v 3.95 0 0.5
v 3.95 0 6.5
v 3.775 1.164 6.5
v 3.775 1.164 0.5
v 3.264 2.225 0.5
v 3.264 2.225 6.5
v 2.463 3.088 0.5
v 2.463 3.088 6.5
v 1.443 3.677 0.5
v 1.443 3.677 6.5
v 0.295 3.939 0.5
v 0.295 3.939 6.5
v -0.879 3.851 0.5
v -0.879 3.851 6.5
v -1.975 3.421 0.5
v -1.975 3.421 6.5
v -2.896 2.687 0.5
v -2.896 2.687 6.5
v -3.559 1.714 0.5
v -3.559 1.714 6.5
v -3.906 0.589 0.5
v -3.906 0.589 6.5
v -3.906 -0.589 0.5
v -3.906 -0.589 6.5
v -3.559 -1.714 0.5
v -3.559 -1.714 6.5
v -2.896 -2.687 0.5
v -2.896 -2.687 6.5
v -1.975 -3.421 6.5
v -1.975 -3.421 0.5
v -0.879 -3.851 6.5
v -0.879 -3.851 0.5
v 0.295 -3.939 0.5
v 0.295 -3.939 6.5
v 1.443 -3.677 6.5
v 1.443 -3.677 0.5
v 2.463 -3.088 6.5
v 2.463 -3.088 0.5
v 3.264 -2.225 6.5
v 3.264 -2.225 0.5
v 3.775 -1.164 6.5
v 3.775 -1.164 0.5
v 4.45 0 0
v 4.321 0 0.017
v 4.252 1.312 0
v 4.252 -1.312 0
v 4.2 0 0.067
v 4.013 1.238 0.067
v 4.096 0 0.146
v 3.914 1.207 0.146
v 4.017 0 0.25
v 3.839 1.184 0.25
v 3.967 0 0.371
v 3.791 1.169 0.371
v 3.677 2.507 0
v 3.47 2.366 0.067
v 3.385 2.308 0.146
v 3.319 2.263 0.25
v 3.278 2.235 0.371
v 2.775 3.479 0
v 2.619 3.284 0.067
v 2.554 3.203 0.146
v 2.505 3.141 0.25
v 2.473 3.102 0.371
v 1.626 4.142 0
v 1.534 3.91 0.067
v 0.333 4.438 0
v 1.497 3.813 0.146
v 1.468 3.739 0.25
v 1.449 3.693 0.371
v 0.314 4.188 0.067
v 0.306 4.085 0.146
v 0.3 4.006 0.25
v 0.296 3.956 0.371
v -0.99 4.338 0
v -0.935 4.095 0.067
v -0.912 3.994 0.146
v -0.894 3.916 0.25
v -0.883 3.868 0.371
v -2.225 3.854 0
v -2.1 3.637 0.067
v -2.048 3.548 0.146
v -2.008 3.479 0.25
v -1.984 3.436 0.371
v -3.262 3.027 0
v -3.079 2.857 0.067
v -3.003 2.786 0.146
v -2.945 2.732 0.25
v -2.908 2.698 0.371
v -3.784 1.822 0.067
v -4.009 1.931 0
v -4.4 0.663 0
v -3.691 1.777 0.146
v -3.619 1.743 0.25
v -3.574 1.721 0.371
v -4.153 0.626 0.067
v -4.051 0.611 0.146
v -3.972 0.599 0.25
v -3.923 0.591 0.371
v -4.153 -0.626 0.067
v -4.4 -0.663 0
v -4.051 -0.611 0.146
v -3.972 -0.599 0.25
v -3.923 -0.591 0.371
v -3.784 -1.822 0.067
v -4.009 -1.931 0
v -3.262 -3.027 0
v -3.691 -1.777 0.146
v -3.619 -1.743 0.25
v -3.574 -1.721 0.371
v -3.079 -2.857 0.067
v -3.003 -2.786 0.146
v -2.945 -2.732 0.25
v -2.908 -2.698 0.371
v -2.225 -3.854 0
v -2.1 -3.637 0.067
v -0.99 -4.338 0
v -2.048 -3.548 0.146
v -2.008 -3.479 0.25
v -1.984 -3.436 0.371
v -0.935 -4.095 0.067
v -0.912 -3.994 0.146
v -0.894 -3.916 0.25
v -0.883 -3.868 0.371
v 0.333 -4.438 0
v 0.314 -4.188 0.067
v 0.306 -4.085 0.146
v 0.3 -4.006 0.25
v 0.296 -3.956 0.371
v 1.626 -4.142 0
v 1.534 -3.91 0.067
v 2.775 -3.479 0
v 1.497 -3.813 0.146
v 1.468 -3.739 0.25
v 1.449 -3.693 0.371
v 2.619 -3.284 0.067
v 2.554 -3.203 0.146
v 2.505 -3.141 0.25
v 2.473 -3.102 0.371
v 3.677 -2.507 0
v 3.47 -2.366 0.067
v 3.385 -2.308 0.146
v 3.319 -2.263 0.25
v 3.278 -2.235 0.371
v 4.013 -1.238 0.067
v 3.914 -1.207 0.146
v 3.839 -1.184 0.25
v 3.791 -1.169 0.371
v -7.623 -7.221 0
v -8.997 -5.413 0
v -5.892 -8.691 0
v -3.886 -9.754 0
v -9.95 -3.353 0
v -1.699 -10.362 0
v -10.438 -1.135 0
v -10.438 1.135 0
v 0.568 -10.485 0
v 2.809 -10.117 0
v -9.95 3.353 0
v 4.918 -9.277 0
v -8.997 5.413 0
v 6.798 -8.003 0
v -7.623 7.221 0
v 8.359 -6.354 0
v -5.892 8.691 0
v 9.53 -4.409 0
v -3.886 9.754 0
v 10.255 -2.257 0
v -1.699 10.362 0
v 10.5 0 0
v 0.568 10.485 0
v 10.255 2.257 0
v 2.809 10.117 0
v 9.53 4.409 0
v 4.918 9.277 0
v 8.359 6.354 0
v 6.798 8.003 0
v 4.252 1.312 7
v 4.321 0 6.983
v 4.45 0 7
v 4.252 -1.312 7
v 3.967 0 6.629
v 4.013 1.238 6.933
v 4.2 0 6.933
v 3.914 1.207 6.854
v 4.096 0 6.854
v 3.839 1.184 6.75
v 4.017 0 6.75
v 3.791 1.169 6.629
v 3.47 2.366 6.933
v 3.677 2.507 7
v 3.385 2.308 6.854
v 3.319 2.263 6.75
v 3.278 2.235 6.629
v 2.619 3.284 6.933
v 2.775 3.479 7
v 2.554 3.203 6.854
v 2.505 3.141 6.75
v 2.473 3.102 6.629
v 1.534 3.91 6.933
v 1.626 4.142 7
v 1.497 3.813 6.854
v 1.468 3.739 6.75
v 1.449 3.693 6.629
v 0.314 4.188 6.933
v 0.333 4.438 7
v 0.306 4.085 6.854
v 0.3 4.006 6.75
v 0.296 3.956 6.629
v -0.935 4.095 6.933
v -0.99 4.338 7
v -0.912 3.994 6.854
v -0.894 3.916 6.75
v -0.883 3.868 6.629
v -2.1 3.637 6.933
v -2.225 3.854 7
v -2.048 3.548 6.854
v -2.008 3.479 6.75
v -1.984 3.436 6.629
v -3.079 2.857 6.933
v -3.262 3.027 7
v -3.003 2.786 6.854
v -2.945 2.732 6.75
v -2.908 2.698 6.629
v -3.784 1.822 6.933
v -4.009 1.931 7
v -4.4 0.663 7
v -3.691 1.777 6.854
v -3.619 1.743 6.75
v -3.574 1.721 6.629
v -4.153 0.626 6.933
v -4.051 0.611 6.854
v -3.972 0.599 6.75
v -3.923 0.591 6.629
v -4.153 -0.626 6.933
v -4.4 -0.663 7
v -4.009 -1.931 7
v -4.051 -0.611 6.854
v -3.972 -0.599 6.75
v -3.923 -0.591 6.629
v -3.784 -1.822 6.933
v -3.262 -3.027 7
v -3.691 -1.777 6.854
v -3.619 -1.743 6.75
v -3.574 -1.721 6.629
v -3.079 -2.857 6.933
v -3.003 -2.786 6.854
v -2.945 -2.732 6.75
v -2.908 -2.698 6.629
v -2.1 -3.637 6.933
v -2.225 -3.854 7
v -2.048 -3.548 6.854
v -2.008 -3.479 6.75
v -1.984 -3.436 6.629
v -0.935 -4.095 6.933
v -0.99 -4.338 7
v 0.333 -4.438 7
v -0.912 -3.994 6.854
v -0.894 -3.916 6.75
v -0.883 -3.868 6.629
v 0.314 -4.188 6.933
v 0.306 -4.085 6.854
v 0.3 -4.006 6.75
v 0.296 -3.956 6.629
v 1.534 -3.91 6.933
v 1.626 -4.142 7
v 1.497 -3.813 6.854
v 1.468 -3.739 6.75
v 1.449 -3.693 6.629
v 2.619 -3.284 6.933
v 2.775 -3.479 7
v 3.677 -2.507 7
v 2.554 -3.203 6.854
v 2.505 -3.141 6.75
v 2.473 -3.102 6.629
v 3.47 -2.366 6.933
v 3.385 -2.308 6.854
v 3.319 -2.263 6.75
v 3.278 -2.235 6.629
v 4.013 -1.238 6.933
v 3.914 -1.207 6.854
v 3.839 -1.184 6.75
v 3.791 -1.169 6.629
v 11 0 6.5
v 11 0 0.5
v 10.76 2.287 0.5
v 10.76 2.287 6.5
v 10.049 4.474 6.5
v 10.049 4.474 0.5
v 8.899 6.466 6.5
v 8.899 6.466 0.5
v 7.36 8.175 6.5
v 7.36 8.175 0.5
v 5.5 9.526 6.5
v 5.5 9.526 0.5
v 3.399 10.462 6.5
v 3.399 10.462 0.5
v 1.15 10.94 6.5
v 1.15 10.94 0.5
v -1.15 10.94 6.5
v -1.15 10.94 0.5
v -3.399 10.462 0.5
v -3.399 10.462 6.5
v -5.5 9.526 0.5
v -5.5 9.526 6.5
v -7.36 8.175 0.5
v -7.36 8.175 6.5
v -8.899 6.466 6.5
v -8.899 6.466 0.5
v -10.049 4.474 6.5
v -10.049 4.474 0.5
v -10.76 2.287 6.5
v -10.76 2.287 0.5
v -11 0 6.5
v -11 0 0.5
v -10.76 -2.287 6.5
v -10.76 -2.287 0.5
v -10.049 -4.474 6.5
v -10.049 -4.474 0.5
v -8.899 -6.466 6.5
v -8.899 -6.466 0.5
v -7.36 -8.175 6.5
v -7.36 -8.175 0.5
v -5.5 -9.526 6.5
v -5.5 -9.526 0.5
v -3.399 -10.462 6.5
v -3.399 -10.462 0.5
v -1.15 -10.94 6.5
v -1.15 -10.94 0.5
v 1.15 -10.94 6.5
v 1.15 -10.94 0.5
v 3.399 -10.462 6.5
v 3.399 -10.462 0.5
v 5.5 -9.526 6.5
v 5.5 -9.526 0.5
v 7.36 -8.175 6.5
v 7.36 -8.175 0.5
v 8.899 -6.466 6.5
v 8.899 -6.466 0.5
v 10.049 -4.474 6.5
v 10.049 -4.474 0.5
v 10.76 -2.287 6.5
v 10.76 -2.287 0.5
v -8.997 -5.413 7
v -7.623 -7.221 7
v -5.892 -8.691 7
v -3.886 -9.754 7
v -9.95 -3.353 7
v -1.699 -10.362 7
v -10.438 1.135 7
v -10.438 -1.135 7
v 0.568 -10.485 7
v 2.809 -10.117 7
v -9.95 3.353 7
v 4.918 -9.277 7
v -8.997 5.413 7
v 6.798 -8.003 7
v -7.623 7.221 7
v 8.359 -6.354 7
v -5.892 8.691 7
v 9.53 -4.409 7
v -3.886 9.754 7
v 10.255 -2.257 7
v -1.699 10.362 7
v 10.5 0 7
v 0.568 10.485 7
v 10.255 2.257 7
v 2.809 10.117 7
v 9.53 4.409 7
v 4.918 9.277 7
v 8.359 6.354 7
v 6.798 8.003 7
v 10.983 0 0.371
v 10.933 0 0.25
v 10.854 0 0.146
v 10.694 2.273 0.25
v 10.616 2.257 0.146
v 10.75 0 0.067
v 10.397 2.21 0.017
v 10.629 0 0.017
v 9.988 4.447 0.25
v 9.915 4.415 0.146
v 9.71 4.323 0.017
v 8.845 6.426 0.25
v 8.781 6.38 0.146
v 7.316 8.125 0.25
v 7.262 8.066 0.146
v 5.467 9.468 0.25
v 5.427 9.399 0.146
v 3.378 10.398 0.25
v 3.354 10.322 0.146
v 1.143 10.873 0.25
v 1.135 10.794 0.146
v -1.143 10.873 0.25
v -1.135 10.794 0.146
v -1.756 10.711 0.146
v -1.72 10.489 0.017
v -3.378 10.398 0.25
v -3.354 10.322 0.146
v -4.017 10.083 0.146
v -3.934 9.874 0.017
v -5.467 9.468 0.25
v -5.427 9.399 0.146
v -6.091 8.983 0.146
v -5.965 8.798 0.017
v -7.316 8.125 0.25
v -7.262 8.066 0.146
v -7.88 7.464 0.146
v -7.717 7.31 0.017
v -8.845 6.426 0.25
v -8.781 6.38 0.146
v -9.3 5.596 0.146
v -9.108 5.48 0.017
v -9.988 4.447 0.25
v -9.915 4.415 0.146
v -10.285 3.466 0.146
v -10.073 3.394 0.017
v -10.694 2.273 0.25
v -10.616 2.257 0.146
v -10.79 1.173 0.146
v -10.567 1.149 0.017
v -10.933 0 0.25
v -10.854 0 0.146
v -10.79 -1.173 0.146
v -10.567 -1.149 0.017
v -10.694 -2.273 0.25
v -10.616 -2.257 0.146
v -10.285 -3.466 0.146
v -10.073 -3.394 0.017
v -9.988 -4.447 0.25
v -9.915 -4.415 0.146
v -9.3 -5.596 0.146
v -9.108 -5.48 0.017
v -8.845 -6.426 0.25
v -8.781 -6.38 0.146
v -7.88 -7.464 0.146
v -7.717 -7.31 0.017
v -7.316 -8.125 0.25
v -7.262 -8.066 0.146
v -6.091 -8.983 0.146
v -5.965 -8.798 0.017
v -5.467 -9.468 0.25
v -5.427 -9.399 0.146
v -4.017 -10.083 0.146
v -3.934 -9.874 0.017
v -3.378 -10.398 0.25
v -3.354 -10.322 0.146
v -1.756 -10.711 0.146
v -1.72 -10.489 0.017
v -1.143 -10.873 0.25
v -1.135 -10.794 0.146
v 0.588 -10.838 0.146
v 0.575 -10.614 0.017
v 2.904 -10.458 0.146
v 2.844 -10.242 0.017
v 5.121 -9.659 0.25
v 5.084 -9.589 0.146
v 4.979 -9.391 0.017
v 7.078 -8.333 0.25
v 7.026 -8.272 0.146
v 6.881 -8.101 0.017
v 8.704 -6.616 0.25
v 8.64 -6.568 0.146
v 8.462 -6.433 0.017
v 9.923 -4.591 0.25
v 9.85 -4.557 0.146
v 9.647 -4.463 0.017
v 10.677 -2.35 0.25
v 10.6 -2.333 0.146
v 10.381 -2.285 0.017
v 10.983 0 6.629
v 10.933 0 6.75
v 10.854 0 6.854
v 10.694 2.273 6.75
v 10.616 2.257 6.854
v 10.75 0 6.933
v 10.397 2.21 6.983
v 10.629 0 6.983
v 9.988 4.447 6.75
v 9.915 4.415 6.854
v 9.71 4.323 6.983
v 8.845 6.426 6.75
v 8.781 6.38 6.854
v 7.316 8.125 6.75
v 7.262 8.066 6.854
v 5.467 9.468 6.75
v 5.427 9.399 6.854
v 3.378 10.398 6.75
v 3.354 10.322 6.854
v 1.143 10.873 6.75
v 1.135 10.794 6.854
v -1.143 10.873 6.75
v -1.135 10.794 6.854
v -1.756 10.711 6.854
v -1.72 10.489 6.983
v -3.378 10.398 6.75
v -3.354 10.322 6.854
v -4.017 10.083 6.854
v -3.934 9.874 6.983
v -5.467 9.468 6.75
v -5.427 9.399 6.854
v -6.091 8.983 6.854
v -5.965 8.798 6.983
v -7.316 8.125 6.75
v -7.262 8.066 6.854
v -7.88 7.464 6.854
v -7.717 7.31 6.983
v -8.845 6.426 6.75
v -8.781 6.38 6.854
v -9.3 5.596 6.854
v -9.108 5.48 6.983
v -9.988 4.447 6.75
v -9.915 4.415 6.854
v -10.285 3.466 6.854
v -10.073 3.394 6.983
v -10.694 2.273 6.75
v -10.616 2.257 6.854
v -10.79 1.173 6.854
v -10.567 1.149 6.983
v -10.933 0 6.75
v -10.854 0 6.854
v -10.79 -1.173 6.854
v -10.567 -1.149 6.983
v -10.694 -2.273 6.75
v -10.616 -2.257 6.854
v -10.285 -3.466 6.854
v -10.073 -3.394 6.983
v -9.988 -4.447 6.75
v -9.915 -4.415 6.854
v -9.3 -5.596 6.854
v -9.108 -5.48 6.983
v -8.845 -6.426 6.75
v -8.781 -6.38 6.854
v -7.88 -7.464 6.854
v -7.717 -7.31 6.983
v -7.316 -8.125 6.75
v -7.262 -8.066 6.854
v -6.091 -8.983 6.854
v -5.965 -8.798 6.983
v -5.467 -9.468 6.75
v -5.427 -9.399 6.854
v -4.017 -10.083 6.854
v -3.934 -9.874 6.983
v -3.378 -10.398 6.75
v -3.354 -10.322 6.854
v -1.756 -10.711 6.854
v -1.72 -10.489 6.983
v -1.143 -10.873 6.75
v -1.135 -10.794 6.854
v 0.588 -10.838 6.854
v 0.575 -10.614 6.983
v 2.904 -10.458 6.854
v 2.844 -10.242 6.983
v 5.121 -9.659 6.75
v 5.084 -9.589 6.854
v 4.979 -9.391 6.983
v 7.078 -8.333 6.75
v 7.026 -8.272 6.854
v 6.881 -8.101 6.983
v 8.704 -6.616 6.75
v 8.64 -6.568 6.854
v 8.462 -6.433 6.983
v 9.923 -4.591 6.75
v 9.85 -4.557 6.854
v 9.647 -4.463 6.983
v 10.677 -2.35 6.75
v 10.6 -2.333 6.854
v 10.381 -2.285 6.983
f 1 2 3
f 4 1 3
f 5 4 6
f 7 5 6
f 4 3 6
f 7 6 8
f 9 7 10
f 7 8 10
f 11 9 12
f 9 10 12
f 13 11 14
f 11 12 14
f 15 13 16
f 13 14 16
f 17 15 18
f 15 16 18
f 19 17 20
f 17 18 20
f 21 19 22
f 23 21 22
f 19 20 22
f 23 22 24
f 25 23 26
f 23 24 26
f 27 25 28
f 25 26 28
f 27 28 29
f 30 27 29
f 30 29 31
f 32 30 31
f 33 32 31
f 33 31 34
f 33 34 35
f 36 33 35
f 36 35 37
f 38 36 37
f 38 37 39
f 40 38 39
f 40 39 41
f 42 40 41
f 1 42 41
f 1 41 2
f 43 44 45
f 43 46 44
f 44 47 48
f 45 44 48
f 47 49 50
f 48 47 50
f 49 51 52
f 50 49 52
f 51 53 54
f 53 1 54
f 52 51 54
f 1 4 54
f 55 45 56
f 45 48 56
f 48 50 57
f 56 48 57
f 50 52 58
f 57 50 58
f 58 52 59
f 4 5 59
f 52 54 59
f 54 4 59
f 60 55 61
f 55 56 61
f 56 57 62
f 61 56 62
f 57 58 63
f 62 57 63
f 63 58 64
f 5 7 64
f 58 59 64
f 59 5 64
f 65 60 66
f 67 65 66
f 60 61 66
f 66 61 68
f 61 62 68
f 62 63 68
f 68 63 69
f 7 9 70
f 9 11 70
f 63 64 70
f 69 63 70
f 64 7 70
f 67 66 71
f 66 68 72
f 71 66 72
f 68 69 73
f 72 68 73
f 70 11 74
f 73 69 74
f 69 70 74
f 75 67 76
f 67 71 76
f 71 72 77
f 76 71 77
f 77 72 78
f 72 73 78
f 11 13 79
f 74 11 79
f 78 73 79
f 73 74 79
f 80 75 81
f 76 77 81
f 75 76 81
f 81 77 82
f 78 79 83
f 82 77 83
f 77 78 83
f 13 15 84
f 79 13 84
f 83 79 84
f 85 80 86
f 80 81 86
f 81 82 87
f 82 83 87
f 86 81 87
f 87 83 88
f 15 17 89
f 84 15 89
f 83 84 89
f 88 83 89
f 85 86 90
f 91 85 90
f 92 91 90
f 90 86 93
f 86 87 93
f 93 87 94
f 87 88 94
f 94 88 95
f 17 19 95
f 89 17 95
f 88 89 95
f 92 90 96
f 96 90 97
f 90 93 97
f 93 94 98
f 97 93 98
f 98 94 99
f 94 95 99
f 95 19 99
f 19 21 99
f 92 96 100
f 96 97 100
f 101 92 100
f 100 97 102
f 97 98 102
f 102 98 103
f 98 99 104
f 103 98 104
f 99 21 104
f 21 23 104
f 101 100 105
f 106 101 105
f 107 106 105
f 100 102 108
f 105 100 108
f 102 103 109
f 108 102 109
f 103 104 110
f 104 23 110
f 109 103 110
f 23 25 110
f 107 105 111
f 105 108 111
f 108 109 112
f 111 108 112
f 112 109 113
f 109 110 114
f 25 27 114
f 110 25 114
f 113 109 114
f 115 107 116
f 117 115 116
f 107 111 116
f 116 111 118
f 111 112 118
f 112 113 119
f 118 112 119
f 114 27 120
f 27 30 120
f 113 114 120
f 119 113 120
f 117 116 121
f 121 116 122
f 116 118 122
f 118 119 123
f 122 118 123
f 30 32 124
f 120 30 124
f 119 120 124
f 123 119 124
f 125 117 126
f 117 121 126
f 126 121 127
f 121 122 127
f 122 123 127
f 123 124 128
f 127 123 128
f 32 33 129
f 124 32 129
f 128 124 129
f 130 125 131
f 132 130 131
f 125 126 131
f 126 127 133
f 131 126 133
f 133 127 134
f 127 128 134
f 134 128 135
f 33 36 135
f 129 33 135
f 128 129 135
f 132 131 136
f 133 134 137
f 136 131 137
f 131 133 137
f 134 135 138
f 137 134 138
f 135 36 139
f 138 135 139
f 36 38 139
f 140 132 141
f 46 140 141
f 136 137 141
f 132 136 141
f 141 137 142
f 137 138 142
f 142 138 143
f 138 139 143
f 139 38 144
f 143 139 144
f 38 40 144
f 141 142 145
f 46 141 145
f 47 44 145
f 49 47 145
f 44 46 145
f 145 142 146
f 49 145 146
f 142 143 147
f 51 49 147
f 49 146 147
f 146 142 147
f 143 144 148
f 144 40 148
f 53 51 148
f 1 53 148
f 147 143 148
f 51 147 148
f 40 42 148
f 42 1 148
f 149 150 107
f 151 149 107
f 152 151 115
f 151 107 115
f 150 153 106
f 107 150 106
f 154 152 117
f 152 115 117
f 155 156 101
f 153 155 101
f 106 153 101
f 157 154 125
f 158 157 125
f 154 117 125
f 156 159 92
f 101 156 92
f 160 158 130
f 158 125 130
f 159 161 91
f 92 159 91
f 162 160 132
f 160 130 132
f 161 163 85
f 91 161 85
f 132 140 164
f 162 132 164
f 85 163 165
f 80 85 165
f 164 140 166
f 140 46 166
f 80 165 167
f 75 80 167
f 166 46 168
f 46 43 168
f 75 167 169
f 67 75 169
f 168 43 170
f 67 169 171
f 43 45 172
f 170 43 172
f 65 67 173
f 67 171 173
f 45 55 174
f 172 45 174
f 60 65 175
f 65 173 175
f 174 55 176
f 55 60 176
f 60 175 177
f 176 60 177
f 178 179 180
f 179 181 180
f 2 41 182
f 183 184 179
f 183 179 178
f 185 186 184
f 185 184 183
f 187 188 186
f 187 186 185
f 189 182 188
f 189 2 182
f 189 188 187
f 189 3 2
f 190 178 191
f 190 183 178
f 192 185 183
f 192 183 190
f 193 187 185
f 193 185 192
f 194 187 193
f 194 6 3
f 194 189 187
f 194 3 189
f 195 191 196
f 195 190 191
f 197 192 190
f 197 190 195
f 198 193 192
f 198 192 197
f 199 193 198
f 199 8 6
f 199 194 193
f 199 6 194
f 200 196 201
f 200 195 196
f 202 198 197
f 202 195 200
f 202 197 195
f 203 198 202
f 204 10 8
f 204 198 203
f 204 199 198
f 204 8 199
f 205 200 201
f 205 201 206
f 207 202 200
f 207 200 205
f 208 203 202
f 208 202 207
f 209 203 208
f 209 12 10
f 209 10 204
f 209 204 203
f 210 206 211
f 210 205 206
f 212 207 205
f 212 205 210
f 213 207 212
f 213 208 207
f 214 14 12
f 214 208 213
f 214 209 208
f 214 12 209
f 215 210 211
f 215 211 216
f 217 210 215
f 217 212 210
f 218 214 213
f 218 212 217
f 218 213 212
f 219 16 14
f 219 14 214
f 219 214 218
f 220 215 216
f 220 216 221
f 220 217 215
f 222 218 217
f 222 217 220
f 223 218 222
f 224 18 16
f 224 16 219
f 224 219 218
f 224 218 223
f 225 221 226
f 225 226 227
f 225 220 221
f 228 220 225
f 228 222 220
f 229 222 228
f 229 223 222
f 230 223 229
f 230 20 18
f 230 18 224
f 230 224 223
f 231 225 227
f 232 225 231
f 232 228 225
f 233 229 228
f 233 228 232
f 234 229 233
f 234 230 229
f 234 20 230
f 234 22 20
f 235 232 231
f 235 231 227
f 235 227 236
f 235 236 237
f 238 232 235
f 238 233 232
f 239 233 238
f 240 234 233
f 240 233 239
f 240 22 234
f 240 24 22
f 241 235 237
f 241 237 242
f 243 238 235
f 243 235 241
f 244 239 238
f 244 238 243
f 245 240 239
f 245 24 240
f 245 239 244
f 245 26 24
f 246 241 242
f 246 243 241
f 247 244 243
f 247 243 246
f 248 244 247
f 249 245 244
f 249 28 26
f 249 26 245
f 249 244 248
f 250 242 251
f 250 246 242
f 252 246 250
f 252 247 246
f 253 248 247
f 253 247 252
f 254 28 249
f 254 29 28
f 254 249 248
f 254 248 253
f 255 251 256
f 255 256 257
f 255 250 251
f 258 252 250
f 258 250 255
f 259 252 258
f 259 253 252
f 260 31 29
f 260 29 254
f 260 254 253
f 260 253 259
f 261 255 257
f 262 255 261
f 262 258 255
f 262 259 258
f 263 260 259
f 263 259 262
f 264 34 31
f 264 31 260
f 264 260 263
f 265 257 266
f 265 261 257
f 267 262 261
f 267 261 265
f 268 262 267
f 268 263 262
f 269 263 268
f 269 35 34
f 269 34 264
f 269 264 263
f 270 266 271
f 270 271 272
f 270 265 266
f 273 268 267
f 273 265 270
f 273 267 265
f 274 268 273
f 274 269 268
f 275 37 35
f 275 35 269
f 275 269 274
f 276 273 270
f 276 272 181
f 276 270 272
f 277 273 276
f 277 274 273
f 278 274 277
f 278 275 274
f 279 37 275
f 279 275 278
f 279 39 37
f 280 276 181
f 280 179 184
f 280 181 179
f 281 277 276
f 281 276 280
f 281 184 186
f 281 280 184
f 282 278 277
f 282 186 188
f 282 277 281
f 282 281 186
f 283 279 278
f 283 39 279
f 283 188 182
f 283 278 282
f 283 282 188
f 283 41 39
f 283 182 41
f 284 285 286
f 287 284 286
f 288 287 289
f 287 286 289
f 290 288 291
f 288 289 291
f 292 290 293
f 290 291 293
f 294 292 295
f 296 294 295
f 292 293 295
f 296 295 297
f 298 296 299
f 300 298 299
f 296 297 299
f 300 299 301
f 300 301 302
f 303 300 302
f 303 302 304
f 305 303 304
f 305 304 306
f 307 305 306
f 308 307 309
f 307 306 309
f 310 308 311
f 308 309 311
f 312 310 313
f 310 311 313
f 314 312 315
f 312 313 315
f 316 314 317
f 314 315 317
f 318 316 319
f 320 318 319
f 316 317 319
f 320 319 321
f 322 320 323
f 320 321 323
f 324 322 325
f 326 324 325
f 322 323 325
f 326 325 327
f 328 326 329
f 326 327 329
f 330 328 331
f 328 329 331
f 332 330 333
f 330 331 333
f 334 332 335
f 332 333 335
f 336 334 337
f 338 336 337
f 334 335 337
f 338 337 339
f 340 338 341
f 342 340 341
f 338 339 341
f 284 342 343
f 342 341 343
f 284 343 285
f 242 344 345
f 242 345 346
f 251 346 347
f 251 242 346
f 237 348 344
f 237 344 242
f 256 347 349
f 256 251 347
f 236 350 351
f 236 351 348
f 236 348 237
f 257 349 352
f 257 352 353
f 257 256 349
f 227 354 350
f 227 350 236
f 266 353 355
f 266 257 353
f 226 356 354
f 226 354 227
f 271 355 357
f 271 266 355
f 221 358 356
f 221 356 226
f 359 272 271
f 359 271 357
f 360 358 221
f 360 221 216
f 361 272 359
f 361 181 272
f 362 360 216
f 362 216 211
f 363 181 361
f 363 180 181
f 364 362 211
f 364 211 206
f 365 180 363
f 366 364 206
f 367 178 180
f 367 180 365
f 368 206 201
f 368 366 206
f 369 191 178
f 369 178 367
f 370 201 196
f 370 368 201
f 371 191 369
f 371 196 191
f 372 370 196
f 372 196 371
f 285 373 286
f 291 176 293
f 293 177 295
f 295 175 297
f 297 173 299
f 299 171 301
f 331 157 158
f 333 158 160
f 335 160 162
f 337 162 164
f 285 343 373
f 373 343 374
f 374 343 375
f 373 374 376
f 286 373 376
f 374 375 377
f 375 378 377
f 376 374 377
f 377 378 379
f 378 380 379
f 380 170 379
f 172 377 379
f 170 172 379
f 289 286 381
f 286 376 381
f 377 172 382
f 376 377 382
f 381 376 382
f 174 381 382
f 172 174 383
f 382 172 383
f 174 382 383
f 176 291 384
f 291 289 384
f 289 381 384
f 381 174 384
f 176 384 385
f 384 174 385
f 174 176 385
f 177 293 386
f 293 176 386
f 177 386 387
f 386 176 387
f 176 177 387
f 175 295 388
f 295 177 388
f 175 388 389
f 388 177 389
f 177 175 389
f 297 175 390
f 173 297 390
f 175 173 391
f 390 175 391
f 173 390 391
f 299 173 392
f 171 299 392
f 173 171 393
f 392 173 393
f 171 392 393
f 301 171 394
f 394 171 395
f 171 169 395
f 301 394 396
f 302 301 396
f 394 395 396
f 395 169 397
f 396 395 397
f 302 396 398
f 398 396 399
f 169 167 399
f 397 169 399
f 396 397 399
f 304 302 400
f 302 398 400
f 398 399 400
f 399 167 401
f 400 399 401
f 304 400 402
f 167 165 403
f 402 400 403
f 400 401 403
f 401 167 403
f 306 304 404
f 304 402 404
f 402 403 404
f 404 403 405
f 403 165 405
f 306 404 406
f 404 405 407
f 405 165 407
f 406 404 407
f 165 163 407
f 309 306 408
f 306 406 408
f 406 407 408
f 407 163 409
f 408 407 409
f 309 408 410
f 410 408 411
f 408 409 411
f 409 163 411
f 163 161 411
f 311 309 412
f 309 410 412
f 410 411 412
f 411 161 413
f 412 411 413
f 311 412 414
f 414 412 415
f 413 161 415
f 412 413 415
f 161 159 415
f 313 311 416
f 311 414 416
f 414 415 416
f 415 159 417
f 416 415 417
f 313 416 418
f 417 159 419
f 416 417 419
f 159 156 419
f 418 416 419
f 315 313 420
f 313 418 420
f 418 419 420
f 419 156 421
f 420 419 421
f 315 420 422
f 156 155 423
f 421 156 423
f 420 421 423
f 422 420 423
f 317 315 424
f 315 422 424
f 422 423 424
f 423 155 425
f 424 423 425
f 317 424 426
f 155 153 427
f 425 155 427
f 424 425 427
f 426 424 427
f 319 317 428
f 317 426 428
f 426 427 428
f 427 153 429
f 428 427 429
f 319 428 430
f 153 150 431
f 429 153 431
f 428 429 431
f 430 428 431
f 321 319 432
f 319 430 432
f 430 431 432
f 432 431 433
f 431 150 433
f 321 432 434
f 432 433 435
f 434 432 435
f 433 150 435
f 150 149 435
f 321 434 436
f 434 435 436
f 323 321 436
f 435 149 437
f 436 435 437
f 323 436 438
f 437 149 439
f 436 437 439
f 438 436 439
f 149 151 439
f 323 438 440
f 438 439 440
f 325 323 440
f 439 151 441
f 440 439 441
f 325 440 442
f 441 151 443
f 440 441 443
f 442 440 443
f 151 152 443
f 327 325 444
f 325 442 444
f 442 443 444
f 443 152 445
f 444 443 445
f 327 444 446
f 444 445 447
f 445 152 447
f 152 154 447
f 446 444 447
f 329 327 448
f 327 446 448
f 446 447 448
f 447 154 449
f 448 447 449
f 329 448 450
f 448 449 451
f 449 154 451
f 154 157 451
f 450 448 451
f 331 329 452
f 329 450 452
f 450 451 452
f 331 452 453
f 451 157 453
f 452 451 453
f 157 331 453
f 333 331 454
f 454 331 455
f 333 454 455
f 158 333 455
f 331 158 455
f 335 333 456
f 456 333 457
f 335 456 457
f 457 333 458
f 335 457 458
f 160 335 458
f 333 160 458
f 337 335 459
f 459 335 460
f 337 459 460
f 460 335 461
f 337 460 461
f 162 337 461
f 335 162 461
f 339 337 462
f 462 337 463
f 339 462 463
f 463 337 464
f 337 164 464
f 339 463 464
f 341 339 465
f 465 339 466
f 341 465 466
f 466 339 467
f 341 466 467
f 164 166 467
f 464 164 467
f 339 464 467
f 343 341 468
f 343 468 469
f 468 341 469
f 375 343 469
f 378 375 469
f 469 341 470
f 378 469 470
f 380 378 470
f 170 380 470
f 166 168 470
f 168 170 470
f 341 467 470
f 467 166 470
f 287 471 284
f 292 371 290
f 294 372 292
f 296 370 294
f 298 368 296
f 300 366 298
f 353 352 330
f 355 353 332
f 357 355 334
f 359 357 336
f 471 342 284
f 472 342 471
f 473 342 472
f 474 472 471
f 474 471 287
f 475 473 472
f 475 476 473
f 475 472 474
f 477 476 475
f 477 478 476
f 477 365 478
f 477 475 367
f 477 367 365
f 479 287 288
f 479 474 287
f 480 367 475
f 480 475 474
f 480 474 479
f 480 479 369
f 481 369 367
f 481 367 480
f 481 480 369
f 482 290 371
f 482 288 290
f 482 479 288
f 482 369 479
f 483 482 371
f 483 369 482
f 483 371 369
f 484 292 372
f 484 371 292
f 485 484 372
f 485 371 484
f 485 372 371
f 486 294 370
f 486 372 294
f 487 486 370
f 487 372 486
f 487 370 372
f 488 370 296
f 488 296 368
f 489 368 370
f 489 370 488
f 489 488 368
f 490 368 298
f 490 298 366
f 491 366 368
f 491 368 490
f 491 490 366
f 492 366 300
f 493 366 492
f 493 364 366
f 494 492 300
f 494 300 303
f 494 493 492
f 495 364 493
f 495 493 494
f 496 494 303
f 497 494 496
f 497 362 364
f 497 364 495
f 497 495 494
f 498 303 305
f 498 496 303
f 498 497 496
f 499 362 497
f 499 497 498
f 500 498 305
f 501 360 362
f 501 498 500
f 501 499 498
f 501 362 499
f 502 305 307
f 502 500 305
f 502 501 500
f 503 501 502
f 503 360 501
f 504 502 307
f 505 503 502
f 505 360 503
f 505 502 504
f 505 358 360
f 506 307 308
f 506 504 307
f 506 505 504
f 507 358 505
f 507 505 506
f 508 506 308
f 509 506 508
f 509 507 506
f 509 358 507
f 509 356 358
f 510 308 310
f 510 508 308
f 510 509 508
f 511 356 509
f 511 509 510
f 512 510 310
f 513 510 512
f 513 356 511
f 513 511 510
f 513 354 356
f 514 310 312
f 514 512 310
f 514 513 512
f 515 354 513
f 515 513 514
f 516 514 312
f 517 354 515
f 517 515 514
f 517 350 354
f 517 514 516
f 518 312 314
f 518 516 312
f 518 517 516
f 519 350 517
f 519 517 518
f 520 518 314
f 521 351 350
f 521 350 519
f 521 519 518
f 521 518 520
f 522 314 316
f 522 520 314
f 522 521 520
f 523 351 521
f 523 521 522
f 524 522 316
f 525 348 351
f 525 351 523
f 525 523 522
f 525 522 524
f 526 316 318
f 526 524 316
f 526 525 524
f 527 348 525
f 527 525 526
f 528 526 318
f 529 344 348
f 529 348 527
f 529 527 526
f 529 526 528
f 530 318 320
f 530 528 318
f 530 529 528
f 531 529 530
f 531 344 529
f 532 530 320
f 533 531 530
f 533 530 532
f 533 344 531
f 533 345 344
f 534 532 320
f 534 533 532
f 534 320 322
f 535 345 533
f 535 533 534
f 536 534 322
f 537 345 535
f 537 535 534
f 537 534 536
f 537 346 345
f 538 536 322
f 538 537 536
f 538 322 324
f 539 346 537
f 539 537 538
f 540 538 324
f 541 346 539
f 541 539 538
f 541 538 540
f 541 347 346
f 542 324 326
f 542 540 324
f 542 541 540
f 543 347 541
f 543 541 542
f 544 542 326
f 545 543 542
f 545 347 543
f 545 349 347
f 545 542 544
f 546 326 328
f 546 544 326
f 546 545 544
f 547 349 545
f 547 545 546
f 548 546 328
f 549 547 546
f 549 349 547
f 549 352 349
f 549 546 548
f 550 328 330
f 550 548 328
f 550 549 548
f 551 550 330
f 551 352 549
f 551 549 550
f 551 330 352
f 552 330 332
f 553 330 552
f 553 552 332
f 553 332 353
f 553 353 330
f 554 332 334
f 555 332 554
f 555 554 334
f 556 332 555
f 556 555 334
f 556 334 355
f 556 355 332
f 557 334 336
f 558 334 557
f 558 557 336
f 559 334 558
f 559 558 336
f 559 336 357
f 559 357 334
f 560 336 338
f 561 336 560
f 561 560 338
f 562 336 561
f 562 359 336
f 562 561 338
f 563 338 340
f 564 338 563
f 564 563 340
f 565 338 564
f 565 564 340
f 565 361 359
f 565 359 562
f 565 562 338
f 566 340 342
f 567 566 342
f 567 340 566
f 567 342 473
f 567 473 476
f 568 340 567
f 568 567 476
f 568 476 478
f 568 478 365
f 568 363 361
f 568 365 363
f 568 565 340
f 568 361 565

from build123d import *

# Parameters (mm, degrees)
F0_R     = 11
F1_DEPTH = 7
F2_R     = 3.95
F3_DEPTH = 7.001
F4_R     = 0.5


with BuildPart() as f1:
    # F0 (on Top) → F1 (new body)
    with BuildSketch(Plane.XY):
        Circle(F0_R)
    extrude(amount=F1_DEPTH)

    # F2 (on face) → F3 (cut, through all)
    with BuildSketch(Plane.XY.offset(7)):
        Circle(F2_R)
    extrude(amount=-F3_DEPTH, mode=Mode.SUBTRACT)

    # F4
    f4_edges = [f1.edges().sort_by_distance(p)[0] for p in [
        (-11, 0, 7),
        (-3.95, 0, 7),
        (-11, 0, 0),
        (-3.95, 0, 0),
    ]]
    fillet(f4_edges, radius=F4_R)


solid = f1.part
